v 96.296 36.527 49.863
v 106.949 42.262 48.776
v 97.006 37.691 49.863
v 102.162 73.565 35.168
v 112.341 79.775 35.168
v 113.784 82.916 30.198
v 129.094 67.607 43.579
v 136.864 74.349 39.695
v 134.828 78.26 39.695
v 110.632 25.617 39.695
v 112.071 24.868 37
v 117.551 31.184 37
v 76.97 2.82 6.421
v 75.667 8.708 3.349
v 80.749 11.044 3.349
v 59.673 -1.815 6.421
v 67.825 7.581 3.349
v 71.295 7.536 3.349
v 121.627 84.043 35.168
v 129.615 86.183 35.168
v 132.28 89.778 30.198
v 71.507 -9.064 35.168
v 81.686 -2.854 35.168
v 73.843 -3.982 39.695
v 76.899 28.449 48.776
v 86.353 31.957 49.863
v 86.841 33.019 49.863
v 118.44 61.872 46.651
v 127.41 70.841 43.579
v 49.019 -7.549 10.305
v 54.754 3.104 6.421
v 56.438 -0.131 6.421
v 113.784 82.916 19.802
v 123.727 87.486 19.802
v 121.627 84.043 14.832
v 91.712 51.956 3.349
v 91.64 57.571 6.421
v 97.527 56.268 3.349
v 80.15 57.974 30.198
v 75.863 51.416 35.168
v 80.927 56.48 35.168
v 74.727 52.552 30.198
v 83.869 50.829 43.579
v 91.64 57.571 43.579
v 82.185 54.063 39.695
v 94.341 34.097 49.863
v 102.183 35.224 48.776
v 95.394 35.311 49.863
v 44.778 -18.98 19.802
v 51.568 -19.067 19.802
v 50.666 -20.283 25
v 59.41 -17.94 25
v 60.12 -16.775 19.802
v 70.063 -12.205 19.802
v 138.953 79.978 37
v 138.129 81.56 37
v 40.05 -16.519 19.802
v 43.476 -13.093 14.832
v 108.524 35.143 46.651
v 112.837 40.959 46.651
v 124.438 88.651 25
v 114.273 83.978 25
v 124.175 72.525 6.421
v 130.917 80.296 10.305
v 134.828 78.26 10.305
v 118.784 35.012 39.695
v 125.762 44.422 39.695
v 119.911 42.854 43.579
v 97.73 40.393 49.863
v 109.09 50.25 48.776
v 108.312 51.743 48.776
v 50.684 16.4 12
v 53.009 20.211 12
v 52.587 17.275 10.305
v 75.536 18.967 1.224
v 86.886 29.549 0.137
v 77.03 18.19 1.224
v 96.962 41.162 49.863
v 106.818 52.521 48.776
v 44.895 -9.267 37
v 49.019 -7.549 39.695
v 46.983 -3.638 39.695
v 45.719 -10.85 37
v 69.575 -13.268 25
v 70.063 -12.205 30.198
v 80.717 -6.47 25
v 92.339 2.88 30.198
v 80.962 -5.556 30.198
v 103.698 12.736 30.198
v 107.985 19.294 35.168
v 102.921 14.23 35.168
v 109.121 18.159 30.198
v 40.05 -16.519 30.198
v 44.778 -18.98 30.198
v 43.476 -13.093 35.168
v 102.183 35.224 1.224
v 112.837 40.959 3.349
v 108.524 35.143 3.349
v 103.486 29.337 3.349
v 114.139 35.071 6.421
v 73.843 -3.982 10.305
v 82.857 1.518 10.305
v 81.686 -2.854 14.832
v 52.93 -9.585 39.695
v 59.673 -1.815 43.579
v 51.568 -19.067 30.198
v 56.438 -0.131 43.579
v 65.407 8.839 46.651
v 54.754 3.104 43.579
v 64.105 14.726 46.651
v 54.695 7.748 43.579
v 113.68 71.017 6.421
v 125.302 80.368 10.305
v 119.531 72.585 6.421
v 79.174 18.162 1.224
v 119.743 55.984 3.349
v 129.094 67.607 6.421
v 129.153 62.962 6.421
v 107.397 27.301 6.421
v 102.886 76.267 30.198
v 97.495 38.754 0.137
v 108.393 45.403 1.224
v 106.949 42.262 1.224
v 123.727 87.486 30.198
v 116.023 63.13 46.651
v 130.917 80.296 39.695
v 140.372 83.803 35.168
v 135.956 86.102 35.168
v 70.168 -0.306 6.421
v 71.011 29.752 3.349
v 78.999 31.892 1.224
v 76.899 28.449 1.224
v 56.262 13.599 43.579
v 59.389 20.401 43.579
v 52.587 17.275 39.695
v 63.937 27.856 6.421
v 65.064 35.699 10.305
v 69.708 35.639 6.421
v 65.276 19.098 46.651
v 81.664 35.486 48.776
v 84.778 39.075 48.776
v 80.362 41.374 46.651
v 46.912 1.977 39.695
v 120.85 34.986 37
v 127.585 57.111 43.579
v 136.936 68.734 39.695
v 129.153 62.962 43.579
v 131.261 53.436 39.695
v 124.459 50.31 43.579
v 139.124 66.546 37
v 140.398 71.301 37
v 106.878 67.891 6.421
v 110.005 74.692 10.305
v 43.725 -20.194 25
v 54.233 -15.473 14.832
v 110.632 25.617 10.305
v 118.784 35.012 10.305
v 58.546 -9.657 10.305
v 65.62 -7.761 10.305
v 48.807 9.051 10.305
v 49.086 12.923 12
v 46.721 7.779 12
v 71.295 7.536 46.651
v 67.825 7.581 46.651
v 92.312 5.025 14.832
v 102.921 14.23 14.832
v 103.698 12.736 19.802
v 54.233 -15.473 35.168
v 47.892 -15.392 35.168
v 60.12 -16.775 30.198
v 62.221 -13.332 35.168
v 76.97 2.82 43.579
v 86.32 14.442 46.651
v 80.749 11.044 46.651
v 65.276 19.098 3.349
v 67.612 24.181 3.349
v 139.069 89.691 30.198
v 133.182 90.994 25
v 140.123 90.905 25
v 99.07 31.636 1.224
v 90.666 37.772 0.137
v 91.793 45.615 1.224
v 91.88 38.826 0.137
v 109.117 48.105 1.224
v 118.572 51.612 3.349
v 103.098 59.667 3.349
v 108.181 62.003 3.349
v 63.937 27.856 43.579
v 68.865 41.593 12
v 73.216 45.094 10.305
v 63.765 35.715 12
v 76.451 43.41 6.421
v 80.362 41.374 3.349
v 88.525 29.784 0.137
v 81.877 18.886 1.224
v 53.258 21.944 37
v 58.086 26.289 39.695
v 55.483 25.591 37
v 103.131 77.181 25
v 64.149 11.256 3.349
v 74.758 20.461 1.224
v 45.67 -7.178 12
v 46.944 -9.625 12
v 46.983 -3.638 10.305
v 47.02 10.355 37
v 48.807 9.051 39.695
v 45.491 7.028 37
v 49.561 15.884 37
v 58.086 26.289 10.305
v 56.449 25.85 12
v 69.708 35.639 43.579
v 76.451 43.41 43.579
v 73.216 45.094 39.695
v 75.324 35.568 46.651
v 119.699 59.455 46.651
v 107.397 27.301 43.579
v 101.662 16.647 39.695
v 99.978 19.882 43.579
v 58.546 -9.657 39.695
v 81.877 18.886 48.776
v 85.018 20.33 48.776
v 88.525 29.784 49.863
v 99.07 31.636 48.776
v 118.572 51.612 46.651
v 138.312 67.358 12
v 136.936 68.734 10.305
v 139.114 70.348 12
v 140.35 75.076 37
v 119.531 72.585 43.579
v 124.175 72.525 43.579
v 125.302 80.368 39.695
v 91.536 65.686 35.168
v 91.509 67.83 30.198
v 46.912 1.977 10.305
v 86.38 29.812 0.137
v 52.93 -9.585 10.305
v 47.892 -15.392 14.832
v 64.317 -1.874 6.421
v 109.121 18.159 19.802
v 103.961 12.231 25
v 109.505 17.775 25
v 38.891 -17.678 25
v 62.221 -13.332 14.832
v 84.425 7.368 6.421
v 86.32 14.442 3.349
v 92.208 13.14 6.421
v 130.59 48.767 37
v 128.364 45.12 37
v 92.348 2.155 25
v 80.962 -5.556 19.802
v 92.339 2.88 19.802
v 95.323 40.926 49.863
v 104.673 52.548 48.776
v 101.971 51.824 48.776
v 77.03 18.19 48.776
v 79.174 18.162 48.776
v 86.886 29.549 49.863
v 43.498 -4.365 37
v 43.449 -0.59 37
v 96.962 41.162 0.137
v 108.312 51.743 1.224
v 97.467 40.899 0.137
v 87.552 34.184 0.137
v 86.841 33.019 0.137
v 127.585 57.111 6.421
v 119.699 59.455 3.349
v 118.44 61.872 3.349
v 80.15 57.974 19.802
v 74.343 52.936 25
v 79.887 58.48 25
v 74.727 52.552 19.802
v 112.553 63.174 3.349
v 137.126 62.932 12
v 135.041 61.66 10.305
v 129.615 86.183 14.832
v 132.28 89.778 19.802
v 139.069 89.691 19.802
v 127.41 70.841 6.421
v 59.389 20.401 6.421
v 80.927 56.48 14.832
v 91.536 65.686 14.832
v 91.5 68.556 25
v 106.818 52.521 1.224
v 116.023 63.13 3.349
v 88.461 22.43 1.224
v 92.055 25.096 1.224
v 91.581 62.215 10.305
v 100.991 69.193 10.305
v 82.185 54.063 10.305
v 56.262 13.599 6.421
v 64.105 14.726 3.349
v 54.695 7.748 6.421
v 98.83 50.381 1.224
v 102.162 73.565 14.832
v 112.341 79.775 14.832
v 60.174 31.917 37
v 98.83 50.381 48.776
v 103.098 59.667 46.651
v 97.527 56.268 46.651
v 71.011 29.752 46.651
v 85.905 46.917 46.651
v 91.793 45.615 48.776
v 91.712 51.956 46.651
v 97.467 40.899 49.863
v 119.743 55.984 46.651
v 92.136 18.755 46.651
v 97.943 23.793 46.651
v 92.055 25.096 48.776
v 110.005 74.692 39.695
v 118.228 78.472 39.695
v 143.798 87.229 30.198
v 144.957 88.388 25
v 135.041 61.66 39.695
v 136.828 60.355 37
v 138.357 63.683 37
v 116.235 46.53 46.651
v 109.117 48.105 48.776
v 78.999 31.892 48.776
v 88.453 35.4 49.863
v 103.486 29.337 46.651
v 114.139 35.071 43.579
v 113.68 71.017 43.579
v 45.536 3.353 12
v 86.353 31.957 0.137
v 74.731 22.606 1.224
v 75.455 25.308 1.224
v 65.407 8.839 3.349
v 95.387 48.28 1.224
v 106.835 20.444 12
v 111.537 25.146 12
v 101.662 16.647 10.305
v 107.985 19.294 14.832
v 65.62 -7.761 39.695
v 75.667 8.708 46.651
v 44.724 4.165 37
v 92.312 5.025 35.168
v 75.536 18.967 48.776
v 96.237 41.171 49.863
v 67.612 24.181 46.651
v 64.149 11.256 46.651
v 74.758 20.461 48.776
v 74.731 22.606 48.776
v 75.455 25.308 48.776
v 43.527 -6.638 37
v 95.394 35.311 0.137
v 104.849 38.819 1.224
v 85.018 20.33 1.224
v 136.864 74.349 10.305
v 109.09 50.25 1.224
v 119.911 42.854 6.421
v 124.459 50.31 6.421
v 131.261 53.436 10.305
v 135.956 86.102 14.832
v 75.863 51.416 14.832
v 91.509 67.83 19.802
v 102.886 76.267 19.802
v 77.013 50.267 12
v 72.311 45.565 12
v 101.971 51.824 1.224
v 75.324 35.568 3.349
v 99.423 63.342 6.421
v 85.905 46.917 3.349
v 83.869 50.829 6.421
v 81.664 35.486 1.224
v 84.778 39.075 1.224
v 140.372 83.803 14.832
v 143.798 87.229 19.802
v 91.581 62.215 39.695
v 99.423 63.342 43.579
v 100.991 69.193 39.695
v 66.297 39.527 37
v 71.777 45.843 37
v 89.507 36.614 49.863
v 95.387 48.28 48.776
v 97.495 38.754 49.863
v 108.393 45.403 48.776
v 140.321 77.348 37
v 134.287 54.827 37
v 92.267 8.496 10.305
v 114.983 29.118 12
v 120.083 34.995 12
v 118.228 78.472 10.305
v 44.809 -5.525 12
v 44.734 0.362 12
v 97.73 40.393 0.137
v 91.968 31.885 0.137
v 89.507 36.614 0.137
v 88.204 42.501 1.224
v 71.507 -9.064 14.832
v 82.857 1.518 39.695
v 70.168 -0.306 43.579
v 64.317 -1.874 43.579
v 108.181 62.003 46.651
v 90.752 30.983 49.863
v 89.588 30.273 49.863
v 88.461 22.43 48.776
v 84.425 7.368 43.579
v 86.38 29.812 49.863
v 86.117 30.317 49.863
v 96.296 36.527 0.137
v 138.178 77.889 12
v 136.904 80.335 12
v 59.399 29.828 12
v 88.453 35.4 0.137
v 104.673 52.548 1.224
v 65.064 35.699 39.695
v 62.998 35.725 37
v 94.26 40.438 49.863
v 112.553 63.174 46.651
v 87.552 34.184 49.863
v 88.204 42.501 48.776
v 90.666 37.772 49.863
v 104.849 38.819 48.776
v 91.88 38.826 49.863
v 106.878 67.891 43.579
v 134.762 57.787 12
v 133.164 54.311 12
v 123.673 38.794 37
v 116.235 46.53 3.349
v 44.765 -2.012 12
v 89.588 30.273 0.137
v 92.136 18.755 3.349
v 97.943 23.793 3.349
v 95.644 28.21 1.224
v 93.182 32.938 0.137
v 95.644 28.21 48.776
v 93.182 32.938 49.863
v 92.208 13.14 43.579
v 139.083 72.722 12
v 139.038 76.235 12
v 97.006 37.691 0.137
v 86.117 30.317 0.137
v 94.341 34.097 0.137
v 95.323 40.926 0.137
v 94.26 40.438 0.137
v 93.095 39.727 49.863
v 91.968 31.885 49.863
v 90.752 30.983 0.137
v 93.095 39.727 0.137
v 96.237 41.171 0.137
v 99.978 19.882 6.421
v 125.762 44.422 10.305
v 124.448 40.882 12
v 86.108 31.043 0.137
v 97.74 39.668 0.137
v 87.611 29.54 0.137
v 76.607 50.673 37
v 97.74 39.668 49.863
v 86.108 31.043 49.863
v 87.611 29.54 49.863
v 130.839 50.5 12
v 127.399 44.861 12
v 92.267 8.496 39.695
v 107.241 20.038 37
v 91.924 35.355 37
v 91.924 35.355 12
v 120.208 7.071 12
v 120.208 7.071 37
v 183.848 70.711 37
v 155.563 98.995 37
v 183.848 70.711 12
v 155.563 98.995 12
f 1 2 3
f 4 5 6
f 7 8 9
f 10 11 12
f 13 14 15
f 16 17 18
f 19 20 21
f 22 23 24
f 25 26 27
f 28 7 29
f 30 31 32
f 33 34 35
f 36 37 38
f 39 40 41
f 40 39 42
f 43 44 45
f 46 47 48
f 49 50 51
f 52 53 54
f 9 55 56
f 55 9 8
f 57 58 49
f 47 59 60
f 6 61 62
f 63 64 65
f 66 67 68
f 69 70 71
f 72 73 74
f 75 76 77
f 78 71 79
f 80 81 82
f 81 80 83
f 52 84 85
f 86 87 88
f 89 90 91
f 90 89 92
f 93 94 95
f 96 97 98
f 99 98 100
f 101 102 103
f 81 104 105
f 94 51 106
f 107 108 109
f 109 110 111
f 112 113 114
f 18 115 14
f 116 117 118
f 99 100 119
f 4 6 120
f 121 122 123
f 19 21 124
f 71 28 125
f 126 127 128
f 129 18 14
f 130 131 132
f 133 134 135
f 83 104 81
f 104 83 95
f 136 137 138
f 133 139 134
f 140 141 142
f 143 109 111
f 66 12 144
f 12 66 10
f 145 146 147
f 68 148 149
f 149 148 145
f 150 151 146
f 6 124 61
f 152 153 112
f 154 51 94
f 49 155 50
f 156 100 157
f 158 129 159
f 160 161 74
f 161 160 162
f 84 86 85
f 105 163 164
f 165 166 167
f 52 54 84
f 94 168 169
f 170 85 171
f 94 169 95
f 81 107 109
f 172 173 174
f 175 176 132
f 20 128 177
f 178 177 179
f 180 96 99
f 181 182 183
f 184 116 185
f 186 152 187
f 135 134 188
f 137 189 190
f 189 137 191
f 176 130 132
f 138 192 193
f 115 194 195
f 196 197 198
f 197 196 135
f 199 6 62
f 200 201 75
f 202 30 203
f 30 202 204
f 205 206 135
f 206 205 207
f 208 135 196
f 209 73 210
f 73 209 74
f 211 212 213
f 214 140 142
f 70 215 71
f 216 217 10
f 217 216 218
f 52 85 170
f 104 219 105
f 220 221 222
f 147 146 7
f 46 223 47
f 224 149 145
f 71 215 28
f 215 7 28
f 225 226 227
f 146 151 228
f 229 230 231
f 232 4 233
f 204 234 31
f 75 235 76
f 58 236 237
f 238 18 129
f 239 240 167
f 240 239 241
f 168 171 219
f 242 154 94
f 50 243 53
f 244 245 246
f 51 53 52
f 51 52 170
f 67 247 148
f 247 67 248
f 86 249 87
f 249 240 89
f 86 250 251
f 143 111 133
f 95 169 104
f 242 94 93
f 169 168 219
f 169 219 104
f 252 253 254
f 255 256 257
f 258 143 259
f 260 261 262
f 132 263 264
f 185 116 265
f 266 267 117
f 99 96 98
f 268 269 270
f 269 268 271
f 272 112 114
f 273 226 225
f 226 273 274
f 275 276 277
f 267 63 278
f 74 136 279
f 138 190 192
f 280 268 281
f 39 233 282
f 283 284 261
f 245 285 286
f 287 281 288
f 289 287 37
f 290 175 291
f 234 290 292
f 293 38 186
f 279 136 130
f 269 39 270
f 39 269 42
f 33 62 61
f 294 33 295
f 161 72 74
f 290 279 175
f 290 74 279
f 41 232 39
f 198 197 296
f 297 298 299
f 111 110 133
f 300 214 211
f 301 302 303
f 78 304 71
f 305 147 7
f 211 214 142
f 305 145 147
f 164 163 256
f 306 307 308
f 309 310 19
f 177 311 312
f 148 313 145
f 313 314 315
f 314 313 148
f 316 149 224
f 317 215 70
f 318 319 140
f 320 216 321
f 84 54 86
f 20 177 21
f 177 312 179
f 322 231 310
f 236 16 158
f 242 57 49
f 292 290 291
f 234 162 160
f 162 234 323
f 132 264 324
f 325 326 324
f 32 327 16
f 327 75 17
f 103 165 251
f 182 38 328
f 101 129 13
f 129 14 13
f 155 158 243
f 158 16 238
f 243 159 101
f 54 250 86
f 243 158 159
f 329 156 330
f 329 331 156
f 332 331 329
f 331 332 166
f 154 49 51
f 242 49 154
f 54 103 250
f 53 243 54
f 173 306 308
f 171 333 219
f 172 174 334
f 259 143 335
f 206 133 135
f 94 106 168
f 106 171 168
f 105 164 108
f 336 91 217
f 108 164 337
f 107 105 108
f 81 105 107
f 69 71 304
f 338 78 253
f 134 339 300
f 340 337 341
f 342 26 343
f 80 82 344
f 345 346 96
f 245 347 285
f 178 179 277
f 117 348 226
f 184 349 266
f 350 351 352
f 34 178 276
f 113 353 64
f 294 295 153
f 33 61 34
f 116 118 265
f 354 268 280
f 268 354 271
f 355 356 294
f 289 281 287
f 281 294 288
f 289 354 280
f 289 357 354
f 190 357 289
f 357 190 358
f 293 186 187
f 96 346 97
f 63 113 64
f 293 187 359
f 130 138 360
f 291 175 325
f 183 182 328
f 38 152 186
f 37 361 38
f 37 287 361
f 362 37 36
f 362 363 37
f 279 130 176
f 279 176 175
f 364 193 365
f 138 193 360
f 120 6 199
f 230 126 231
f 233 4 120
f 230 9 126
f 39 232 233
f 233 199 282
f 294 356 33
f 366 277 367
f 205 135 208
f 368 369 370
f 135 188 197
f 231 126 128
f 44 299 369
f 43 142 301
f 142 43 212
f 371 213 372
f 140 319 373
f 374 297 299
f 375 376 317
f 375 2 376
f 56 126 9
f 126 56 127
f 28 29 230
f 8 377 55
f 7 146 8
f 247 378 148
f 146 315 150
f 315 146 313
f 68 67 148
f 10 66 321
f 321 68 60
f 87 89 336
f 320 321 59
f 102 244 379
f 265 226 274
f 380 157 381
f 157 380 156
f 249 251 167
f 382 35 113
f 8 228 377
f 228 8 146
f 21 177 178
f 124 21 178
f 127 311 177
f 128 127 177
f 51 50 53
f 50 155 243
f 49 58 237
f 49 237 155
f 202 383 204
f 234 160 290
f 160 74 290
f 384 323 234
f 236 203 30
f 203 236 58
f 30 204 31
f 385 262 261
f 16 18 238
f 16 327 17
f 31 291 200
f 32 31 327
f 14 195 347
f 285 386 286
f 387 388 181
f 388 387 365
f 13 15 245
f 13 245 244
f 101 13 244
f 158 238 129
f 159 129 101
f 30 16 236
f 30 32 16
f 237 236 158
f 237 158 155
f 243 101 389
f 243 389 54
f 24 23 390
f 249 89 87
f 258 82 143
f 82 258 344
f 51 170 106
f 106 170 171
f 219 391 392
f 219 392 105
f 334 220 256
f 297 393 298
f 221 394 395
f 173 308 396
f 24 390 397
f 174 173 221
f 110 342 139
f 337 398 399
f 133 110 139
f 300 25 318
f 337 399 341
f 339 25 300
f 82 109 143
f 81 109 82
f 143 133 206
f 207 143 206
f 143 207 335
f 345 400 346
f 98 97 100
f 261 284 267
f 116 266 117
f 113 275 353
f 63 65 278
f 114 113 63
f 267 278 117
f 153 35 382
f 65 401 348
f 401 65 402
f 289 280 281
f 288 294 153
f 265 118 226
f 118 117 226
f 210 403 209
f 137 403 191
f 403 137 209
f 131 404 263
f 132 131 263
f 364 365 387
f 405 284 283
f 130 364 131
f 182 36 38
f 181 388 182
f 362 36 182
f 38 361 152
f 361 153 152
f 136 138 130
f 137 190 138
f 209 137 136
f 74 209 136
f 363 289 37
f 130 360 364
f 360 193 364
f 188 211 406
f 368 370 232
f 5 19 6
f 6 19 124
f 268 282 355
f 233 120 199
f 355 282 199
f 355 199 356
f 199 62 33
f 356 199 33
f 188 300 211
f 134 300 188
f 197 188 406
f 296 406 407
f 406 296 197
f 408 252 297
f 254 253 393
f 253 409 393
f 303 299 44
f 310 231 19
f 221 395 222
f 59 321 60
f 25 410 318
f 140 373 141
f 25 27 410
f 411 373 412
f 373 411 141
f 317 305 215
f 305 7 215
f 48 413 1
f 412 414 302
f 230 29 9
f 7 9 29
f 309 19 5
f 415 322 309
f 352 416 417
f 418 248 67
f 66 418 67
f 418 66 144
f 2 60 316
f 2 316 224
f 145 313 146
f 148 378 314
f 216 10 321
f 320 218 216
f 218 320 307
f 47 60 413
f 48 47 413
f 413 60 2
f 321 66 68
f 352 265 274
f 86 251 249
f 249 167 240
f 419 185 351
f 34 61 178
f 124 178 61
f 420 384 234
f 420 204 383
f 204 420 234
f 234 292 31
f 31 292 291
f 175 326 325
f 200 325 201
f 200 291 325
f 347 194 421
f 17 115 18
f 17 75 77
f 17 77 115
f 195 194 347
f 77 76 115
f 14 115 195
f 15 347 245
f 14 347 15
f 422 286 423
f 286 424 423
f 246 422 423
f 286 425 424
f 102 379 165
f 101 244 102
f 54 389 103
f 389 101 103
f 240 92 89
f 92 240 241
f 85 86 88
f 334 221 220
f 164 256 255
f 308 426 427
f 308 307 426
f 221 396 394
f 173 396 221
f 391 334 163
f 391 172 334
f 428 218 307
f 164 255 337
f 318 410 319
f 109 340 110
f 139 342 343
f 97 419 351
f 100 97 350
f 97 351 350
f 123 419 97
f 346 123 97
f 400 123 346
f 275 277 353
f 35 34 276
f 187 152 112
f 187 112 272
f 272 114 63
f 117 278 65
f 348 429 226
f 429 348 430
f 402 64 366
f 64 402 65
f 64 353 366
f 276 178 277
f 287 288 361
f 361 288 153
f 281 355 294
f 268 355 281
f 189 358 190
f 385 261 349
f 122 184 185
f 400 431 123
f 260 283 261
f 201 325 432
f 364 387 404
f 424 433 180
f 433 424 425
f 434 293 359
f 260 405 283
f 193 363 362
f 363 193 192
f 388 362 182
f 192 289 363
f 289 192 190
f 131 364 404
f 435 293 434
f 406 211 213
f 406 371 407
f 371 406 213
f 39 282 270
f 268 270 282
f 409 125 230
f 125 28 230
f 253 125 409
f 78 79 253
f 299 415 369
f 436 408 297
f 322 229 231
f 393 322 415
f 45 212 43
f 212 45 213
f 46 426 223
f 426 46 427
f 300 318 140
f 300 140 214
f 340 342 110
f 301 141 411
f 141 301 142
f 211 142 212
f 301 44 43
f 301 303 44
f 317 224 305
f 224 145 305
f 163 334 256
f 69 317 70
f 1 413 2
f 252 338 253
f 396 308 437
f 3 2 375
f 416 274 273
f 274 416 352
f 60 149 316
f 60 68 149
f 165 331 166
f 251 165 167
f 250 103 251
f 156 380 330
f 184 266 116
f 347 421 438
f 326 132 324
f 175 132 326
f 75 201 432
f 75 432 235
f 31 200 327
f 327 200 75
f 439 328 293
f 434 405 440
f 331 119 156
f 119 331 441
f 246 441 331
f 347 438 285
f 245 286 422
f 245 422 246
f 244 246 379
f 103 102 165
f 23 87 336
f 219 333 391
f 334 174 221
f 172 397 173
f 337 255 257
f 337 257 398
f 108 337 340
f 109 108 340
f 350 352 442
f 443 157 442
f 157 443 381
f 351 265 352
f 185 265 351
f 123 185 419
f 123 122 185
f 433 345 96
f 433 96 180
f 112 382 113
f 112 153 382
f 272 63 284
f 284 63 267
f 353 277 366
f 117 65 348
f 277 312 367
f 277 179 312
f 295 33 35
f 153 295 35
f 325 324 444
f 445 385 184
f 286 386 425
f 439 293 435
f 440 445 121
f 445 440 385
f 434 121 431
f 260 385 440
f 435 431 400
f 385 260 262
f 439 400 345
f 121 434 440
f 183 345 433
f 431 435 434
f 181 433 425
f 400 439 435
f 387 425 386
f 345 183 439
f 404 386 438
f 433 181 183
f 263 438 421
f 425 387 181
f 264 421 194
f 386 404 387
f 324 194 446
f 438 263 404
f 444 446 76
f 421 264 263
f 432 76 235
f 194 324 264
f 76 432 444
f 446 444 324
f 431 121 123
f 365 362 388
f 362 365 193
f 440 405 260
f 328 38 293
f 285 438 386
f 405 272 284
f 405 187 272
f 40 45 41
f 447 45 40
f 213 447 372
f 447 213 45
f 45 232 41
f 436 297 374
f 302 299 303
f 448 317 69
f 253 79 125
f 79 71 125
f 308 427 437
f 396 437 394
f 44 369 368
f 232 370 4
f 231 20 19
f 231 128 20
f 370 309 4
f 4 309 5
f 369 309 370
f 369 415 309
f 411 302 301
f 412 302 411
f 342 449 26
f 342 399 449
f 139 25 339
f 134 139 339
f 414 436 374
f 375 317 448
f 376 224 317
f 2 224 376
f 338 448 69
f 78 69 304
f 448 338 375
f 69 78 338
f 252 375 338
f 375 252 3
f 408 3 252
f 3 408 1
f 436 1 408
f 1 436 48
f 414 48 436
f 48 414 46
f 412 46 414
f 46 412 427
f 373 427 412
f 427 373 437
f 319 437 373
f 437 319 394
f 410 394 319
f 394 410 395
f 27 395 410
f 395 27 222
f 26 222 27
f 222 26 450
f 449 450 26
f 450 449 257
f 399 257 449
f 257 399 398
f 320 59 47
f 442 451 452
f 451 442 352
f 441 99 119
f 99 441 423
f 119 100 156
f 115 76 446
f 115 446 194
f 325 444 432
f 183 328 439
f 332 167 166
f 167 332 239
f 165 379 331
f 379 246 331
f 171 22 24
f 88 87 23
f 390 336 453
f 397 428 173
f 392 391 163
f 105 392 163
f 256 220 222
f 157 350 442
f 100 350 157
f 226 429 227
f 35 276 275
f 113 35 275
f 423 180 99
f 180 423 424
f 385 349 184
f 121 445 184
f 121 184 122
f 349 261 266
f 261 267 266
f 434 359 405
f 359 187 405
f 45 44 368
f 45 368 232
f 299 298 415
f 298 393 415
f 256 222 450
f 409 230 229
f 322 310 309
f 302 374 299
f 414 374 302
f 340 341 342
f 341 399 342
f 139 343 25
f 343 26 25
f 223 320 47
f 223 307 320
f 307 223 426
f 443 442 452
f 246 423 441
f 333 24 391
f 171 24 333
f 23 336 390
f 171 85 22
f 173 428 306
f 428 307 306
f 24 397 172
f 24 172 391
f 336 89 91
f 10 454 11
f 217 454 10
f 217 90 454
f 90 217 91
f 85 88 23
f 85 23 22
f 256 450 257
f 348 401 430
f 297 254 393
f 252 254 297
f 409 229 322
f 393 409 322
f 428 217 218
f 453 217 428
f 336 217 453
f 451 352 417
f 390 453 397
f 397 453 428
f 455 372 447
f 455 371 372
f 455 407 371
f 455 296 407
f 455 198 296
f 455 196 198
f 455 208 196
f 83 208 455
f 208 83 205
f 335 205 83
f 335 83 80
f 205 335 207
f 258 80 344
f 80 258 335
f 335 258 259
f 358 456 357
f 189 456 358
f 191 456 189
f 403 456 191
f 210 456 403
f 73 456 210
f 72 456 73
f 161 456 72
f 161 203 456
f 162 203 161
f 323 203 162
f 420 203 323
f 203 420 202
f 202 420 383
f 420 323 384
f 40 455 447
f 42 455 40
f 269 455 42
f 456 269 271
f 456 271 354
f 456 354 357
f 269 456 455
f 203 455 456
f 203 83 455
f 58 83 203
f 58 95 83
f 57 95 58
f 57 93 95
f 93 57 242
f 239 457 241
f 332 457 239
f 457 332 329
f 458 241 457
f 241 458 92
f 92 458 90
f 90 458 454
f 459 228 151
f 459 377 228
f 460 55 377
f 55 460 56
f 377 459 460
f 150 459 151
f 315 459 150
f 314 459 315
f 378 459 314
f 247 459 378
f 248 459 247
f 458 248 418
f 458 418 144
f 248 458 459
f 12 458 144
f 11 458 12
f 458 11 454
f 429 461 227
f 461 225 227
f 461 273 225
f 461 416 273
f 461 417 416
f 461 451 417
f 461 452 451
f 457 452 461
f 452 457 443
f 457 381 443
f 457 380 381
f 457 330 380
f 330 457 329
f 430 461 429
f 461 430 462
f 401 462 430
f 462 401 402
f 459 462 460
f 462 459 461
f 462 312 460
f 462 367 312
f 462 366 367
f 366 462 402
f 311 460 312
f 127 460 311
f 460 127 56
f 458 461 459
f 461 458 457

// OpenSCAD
rotate(45){
scale ([ 3, 1, 1 ]){
mirror([ 1, 0, 0 ]){
translate([ -30, -40, 0 ]){
union(){
difference(){
union(){
color("red"){
}
translate([ 0, 0, 25 ]){
sphere(d=50);
}
}
color("green"){
translate([ 0, 0, 12 ]){
cube([ 30, 40, 25 ]);
}
}
}
color("blue"){
translate([ -30, -40, 0 ]){
color("green"){
translate([ 0, 0, 12 ]){
cube([ 30, 40, 25 ]);
}
}
}
}
}
}
}
}
}
